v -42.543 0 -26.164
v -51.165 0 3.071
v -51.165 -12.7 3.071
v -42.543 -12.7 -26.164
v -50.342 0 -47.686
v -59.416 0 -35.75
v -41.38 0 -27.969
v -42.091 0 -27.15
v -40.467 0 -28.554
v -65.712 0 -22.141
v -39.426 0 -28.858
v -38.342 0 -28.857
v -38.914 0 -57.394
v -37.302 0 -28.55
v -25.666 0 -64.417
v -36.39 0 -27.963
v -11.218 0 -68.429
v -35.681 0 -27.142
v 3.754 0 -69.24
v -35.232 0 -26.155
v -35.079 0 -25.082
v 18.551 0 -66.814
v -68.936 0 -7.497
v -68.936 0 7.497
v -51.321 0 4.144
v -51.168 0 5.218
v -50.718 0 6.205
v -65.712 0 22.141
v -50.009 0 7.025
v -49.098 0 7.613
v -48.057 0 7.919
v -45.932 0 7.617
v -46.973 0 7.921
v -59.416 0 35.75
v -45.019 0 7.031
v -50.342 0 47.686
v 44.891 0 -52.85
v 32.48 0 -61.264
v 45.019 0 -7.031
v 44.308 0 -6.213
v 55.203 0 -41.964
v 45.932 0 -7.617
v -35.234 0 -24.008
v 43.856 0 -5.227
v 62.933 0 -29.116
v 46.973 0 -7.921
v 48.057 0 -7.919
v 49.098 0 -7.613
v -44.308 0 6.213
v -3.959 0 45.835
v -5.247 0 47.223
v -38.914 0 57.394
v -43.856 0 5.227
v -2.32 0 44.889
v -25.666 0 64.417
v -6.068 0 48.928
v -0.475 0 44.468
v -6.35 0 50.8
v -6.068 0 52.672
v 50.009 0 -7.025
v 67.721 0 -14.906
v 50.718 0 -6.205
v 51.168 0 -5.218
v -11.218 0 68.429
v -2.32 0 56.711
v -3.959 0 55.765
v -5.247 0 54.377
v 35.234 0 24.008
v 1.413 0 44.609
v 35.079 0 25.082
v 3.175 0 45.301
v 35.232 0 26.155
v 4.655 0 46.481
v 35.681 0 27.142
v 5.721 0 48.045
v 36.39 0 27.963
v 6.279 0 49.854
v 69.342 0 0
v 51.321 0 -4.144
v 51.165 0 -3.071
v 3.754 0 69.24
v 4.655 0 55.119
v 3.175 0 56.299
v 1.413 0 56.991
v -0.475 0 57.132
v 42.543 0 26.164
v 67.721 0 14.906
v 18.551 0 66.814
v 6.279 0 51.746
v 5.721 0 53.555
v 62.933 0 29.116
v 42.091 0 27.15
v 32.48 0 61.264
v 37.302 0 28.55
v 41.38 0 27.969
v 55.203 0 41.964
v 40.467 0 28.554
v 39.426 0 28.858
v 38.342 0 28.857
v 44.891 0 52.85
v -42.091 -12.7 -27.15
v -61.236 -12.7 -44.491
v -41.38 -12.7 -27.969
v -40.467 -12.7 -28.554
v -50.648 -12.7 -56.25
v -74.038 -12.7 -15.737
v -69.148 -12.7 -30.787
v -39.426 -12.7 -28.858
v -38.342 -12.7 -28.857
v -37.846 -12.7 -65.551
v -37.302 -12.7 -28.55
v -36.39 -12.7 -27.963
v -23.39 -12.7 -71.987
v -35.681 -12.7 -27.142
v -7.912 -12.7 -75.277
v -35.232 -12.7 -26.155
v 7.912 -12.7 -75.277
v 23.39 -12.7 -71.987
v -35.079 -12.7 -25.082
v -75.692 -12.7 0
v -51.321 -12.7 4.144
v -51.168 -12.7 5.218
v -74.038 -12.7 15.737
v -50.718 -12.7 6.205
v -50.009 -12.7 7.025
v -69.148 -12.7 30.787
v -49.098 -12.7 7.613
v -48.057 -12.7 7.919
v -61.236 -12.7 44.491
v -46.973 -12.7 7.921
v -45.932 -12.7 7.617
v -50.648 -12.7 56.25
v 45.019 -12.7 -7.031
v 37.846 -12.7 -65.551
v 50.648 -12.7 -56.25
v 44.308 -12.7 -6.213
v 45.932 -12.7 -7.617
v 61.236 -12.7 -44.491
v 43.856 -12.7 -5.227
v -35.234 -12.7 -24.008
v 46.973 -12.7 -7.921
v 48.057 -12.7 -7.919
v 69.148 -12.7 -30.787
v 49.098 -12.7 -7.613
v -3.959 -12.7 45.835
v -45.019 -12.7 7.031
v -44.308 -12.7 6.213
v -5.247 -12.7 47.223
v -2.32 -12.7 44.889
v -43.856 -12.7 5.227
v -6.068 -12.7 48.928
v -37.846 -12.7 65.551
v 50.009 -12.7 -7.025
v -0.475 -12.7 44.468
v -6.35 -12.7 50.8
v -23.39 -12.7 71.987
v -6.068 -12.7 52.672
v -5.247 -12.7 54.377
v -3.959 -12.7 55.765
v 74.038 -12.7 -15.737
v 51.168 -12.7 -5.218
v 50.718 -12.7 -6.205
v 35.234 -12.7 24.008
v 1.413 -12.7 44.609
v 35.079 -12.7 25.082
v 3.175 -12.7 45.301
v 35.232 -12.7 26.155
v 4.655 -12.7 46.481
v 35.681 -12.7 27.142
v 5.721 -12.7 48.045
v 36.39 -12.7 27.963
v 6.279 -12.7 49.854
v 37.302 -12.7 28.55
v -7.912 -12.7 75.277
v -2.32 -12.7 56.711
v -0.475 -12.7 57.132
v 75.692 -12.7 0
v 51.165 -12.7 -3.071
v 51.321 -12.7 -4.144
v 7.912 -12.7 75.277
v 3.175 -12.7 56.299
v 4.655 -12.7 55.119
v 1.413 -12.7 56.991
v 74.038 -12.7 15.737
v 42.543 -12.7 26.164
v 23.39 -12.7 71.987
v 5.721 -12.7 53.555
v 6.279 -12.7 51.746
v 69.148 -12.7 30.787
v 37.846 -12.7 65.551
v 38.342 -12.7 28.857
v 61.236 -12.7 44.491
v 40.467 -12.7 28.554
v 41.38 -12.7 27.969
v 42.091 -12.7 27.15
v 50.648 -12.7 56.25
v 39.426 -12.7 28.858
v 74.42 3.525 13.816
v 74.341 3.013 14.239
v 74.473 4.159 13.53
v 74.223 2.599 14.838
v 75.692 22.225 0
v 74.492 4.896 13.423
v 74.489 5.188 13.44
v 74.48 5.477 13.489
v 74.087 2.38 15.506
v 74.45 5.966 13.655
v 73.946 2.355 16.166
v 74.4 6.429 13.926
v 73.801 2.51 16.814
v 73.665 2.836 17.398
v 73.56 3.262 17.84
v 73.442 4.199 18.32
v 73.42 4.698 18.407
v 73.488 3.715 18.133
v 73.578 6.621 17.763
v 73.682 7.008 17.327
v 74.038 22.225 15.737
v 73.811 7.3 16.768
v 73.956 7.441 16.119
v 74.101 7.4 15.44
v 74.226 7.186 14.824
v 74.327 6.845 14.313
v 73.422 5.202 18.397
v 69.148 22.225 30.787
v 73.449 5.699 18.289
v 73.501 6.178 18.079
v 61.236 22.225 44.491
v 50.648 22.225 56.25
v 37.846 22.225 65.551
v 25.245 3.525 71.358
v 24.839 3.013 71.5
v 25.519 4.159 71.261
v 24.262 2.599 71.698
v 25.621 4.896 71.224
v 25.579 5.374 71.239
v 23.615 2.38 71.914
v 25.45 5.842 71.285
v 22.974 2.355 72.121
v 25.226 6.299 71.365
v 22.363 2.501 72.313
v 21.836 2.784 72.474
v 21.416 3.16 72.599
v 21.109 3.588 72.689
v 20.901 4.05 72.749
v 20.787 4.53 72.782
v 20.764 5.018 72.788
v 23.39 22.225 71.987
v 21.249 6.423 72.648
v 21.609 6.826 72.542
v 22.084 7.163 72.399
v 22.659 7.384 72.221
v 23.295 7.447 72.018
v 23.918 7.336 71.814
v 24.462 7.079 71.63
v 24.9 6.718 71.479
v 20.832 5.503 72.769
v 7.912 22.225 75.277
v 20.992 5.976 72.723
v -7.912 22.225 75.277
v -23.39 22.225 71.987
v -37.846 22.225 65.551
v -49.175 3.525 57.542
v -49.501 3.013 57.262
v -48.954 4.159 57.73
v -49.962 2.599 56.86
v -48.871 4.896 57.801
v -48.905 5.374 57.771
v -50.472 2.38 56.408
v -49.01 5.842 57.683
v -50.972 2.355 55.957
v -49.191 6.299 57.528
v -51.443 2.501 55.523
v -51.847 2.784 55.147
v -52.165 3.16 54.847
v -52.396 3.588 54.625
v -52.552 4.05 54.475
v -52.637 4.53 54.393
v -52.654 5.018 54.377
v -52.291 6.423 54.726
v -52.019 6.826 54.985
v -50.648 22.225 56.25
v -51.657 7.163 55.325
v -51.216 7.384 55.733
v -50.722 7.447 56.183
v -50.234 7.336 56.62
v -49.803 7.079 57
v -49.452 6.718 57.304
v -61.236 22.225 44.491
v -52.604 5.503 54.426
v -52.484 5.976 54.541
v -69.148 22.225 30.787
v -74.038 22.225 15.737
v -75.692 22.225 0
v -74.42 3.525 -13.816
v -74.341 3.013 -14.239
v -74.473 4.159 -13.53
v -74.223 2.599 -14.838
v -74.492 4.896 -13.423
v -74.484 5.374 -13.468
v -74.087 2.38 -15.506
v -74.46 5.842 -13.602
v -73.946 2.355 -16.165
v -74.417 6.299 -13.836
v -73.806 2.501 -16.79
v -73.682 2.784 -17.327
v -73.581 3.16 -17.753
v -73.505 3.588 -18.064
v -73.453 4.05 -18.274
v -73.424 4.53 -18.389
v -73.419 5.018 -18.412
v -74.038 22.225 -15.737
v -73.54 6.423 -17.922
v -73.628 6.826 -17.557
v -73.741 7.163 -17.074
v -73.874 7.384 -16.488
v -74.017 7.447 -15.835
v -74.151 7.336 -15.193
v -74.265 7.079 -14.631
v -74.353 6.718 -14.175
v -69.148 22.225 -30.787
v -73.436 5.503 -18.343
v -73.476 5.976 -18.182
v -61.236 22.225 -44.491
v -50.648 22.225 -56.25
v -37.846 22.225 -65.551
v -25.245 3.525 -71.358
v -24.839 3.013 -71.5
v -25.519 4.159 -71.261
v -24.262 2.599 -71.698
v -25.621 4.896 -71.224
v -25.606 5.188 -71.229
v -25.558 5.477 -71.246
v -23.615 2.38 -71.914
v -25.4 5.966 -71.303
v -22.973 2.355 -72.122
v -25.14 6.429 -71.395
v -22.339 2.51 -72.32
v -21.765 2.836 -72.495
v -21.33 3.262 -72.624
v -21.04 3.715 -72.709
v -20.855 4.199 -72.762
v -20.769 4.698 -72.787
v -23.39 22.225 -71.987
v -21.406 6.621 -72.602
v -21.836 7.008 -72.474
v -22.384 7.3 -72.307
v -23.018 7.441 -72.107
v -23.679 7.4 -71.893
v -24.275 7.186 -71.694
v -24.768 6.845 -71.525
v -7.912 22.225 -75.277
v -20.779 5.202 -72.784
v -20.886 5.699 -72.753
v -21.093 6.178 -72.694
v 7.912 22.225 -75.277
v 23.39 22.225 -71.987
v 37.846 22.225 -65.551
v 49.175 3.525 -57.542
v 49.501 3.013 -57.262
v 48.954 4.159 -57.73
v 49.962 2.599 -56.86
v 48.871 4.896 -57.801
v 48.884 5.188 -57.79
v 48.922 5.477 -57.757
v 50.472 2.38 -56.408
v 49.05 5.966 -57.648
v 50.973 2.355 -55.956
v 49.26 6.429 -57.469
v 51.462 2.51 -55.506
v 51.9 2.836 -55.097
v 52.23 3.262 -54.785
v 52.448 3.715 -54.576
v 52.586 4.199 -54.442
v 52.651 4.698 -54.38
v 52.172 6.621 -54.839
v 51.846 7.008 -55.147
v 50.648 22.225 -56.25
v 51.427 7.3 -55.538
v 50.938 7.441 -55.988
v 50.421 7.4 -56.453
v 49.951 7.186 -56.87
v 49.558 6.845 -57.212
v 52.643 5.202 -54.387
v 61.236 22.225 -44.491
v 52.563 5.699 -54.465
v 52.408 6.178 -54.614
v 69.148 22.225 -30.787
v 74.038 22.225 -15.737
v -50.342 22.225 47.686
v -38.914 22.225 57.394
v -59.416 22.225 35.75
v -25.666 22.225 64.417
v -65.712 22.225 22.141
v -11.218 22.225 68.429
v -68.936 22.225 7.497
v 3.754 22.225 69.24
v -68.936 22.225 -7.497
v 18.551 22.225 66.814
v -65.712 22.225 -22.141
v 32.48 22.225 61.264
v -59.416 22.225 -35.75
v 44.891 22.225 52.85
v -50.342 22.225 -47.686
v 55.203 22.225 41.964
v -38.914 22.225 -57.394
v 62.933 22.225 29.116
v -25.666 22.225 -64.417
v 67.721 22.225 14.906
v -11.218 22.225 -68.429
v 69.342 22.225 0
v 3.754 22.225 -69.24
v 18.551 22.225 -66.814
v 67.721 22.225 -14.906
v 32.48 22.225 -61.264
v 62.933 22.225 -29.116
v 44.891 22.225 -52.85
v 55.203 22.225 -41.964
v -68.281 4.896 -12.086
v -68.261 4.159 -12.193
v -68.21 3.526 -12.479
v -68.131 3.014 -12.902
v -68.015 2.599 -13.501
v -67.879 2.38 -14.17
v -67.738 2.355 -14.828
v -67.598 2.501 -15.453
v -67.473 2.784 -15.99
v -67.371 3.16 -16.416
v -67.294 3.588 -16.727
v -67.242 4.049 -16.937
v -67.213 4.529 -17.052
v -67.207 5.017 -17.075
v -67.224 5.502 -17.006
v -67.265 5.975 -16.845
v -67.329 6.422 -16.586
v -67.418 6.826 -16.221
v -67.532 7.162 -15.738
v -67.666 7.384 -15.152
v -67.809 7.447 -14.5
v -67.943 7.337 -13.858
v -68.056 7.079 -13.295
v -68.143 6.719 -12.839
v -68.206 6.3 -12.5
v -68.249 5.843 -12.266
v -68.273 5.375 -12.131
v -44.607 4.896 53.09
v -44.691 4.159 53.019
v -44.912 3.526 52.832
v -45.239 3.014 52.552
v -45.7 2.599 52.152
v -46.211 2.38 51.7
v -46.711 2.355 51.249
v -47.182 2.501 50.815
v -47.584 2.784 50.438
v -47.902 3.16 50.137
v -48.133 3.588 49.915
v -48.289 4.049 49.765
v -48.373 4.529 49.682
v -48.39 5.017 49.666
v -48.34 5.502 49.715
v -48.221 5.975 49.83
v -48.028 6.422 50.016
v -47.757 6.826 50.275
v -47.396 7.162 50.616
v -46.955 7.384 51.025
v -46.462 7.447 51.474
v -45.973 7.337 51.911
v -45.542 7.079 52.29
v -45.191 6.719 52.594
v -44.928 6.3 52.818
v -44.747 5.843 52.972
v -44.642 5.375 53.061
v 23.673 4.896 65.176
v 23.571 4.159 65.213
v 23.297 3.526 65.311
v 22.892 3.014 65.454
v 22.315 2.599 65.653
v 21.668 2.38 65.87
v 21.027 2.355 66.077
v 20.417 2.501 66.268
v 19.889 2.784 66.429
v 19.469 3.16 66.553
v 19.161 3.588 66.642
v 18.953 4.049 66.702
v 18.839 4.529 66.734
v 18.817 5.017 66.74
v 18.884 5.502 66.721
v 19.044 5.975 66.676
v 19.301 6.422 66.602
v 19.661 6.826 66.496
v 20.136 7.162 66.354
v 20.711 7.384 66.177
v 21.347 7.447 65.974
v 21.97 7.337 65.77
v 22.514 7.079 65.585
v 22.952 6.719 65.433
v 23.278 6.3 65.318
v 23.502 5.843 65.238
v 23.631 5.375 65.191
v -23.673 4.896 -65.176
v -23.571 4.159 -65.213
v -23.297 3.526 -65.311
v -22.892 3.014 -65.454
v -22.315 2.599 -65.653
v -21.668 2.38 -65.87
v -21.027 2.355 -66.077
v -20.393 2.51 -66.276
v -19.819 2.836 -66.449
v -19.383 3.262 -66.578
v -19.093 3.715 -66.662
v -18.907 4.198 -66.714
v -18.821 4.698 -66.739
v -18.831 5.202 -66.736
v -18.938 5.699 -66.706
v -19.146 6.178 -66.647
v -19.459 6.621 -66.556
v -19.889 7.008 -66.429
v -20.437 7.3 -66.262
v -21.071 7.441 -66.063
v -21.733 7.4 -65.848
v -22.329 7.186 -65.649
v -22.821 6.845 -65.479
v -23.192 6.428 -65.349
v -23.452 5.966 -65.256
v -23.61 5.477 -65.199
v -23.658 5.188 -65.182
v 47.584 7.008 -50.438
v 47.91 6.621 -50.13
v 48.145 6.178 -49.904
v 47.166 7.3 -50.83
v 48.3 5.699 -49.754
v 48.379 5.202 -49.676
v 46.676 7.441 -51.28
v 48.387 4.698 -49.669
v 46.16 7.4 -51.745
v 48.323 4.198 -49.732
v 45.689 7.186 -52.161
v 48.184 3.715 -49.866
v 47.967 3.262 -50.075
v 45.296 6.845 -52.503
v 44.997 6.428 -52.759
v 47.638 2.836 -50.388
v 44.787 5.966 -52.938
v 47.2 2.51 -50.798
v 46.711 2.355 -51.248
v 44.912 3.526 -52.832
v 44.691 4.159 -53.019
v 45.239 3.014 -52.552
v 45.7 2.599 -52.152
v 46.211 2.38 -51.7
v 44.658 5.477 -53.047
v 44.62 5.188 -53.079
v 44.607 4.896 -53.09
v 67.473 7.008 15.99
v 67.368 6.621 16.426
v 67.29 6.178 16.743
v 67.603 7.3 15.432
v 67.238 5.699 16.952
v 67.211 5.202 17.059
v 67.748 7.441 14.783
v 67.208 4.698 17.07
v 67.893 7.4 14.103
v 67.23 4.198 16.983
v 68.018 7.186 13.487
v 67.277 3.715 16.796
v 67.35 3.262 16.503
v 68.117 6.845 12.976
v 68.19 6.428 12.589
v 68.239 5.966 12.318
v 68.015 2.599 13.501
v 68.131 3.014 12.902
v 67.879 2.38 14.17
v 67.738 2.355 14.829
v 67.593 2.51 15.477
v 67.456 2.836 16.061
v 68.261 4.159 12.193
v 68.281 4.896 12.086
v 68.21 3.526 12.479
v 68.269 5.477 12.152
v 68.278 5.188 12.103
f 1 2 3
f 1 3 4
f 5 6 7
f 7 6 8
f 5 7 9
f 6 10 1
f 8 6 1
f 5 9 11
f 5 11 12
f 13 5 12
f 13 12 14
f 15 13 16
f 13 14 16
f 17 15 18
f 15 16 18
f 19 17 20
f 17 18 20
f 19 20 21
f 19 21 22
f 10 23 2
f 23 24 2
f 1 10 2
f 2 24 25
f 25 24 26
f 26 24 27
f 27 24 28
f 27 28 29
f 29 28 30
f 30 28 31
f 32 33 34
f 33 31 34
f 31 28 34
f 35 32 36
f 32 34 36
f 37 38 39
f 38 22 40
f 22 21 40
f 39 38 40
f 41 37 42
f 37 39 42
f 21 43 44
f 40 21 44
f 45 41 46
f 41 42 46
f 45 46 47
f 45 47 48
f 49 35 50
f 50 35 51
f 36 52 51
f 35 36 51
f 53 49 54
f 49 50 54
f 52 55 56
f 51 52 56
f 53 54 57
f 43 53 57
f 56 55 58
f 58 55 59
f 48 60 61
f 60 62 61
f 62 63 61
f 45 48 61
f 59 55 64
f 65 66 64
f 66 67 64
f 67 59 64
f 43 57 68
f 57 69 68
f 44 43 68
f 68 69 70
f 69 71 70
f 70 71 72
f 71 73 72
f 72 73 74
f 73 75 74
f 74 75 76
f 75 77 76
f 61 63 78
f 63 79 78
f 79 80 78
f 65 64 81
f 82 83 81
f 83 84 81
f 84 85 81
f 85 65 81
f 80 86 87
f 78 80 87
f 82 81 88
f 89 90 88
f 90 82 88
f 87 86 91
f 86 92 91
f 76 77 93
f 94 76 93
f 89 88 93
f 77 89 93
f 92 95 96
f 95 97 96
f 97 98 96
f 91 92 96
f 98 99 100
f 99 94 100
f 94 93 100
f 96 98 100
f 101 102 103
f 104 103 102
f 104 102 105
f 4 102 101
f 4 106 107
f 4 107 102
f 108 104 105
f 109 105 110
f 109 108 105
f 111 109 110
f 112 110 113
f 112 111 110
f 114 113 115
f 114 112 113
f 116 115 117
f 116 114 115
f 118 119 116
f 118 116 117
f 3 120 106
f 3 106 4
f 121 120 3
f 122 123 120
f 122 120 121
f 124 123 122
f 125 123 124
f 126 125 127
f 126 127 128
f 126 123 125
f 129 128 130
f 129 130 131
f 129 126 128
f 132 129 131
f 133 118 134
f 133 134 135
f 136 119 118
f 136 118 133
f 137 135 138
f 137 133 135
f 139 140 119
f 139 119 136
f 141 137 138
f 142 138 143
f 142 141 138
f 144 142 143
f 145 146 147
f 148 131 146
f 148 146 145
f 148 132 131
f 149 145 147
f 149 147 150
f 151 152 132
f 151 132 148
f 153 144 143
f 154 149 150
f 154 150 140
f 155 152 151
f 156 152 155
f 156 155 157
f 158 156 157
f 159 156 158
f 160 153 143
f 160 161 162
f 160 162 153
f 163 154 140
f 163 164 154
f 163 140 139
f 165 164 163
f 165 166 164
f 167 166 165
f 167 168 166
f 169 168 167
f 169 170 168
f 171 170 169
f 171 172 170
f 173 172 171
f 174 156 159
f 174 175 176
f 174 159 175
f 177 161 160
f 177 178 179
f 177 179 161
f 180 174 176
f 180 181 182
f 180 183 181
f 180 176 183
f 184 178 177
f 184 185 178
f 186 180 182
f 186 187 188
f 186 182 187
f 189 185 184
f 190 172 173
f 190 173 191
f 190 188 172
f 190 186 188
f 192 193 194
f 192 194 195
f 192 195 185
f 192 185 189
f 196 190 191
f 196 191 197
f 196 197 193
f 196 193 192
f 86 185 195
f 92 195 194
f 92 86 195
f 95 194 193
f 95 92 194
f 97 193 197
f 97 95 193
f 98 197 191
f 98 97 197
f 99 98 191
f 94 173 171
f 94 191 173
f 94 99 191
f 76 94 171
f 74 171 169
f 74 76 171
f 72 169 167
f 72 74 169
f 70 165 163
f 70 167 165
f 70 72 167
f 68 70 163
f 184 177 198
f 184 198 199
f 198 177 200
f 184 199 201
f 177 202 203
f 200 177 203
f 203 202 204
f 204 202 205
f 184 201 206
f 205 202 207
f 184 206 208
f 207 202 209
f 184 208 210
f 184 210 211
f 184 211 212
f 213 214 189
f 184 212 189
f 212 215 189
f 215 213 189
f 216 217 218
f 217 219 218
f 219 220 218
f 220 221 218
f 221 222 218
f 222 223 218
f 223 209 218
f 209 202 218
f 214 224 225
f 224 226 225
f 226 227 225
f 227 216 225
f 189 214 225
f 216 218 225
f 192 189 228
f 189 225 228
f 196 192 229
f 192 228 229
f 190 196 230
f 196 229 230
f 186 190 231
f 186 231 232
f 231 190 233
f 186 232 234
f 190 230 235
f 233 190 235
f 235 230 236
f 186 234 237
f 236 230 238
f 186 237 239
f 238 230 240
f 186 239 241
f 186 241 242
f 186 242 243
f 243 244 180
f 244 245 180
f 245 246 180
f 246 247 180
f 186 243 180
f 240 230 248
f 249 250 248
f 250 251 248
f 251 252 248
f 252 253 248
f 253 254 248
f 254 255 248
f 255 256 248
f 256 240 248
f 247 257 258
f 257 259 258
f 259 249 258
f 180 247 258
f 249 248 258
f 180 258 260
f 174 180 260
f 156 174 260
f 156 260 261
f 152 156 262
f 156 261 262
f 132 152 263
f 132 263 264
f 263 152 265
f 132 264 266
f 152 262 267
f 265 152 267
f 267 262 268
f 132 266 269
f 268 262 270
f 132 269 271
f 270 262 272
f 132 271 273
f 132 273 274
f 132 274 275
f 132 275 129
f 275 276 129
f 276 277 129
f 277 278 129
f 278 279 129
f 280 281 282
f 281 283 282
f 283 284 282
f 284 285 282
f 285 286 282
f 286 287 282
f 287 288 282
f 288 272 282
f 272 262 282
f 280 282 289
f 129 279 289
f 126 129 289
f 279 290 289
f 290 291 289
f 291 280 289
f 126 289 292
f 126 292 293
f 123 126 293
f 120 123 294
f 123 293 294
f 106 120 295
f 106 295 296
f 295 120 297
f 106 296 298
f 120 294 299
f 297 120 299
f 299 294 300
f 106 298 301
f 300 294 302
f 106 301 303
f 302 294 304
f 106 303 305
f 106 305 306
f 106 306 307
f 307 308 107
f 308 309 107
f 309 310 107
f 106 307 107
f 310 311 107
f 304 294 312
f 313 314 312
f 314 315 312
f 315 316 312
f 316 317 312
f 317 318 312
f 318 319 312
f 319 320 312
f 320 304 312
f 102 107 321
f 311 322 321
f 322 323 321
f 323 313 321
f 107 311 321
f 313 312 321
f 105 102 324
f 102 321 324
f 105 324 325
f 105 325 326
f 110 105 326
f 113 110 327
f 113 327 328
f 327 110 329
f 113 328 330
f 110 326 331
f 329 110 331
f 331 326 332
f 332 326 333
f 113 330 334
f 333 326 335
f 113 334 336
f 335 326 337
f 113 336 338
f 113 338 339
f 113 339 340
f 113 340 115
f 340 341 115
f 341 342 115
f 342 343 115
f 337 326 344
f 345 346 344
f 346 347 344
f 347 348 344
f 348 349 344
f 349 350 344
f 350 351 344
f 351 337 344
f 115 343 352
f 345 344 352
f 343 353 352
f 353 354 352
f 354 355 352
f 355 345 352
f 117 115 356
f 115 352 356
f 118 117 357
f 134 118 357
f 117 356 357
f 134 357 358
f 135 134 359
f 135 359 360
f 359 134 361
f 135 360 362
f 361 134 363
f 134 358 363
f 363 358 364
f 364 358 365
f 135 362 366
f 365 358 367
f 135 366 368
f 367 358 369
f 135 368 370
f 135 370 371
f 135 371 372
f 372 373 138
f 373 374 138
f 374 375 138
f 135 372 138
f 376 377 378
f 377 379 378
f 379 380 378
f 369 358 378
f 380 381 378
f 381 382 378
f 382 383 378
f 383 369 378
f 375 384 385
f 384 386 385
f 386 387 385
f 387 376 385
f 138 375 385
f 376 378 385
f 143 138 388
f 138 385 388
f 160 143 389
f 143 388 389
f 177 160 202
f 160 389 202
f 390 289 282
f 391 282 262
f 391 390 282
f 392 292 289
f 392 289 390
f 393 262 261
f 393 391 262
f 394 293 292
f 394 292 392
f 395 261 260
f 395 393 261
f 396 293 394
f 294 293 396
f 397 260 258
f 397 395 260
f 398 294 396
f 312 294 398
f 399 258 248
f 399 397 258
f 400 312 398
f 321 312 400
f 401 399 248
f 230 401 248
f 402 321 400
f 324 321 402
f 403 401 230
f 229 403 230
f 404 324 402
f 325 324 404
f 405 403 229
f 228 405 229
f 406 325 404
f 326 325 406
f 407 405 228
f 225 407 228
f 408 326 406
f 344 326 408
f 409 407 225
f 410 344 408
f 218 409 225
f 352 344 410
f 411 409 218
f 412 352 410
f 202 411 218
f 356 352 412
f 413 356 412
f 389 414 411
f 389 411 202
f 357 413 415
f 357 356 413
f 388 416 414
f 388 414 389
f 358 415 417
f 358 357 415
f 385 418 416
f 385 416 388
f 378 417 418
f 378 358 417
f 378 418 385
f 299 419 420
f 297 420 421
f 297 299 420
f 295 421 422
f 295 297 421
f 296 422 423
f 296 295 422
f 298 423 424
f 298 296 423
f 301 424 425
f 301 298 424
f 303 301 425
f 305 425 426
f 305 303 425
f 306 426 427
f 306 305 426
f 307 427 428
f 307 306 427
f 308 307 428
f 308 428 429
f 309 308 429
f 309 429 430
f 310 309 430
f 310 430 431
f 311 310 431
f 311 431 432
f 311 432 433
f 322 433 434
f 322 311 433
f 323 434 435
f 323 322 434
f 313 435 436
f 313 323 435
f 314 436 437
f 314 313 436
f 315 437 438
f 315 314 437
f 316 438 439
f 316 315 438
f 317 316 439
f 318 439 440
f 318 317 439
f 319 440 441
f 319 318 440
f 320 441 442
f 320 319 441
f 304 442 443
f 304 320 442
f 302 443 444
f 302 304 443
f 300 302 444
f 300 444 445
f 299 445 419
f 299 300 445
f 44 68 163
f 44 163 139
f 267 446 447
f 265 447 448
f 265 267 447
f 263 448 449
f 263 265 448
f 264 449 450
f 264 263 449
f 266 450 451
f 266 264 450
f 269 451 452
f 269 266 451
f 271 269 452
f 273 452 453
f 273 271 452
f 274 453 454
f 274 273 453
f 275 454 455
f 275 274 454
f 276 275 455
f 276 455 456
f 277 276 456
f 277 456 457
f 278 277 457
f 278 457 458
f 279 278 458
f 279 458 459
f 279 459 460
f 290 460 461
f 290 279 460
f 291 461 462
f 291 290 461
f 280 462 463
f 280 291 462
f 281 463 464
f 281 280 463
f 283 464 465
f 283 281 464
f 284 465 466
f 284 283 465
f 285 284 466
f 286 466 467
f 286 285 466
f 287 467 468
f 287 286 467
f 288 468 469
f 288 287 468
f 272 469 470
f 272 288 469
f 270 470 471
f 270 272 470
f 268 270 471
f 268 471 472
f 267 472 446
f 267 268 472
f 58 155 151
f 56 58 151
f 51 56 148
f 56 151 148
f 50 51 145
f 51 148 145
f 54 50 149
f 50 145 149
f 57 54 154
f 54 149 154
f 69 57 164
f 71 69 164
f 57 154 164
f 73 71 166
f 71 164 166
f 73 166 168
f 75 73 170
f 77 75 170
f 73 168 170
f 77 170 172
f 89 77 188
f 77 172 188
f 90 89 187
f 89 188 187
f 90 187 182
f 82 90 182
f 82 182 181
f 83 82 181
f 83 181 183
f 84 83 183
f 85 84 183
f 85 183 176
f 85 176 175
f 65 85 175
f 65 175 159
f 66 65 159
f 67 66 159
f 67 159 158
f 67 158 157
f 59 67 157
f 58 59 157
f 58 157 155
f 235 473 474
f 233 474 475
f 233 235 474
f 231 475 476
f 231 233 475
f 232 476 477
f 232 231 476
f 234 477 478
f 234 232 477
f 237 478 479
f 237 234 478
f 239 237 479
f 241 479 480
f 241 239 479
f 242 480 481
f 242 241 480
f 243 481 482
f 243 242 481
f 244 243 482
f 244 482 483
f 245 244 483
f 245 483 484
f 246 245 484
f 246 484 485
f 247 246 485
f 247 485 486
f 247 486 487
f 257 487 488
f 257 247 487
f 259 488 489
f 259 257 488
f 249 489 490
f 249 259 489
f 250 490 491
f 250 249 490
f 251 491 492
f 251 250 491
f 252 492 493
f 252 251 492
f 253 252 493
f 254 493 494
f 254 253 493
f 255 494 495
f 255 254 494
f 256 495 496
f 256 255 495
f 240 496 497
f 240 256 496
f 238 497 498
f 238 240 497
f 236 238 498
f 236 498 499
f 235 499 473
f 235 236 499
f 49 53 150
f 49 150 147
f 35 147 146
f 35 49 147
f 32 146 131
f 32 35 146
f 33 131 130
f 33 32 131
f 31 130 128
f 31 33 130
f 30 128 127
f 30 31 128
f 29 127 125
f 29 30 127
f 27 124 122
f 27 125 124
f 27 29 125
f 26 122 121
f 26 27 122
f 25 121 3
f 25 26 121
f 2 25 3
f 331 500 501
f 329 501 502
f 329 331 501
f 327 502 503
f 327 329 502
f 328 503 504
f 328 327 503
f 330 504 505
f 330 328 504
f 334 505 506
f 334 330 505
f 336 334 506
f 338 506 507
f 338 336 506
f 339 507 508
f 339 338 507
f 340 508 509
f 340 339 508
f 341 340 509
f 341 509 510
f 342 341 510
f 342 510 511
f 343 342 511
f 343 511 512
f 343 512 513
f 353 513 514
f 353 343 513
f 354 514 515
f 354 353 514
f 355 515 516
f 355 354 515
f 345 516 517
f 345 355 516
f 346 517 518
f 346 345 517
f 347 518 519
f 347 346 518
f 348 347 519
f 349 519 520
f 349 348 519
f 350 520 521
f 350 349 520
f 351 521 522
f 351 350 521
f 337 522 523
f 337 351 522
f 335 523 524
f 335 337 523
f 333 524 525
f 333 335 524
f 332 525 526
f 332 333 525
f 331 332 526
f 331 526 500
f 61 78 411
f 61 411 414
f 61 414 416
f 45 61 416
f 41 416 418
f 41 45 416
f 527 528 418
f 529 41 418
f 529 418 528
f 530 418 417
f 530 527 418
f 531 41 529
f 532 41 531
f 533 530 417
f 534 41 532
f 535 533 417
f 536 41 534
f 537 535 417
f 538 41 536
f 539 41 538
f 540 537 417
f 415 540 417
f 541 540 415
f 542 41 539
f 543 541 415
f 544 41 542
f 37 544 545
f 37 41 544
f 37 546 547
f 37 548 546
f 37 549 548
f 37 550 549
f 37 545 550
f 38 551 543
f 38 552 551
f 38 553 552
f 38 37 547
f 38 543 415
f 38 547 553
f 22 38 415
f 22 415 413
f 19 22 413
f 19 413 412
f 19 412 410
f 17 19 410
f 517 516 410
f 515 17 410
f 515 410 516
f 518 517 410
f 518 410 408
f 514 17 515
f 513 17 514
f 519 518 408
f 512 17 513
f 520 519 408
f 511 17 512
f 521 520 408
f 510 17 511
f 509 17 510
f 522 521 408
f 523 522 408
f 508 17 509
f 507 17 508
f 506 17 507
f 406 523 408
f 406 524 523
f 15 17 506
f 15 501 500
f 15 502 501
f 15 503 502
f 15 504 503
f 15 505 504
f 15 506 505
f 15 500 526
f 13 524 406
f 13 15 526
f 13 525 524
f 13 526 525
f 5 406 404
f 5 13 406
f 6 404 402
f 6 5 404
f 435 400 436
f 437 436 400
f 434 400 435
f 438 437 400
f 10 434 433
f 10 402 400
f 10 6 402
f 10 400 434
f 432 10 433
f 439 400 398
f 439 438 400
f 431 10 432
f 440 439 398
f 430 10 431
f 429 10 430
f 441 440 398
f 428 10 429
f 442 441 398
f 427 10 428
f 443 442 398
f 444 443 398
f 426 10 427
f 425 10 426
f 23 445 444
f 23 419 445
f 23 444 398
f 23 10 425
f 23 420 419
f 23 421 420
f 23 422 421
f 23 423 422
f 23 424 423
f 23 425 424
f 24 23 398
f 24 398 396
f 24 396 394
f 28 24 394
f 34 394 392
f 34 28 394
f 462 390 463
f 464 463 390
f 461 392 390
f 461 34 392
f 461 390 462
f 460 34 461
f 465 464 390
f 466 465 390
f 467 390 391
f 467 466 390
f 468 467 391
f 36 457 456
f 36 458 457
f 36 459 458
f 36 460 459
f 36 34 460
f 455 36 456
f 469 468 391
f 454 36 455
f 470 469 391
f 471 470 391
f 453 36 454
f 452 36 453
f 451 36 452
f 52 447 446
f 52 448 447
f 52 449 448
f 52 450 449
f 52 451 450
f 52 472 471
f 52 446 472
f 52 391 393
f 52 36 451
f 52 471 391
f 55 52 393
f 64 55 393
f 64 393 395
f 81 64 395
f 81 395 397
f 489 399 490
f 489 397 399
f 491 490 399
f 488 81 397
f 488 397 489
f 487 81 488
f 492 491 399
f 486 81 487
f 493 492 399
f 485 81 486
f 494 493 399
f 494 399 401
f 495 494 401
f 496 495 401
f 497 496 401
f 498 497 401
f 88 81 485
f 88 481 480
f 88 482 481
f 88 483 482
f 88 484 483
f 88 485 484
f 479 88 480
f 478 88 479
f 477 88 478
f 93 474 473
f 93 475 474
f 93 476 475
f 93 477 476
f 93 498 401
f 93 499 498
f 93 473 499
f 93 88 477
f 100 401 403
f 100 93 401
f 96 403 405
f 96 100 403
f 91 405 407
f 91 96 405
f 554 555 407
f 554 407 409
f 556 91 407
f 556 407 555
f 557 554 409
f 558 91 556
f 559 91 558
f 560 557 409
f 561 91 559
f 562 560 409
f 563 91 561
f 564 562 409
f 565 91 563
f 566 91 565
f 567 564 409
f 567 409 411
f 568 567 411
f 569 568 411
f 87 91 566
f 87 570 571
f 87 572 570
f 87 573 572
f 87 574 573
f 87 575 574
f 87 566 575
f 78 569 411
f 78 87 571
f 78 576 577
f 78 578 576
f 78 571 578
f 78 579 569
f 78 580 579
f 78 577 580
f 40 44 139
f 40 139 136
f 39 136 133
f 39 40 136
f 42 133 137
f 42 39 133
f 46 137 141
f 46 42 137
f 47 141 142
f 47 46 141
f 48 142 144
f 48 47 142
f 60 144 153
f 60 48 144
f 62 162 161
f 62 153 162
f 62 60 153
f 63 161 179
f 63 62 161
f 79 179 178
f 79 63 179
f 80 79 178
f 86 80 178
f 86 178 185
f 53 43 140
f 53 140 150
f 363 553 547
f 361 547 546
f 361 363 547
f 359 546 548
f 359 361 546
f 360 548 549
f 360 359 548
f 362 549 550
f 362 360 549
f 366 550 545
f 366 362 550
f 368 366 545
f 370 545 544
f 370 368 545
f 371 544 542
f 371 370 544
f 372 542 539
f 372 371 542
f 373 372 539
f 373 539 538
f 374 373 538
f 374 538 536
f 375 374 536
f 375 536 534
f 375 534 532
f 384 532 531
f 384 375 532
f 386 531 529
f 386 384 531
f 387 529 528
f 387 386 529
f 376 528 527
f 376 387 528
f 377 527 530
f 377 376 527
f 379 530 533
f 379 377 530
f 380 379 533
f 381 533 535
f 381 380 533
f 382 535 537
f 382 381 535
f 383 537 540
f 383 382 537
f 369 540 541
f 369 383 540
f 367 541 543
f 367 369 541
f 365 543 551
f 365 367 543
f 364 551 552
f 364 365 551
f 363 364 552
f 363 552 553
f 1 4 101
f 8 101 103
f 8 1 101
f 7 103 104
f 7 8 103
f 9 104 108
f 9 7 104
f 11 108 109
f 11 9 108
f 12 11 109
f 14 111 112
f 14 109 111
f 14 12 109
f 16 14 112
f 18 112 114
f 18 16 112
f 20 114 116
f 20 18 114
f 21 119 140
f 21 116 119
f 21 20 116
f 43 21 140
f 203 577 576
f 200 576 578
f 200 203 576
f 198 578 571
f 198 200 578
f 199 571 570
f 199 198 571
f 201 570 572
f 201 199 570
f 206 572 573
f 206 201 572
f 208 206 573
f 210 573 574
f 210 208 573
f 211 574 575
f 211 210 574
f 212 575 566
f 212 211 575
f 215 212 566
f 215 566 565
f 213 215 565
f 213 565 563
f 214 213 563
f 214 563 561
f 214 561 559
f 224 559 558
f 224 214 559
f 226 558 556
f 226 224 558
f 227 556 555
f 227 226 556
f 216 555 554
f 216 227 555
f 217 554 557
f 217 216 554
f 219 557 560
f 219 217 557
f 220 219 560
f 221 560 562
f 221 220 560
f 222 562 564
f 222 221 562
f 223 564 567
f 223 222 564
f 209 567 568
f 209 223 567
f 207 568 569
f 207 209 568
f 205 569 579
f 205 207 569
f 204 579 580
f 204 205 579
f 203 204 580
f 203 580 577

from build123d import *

# Parameters (mm, degrees)
SKETCH1_R                            = 75.692
SKETCH1_R_2                          = 69.342
BOSS_EXTRUDE1_DEPTH                  = 22.225
SKETCH2_R                            = 75.692
BOSS_EXTRUDE2_DEPTH                  = 12.7
TAP_DRILL_FOR_1_4_20_TAP1_AT_2_COUNT = 2
TAP_DRILL_FOR_1_4_20_TAP1_AT_2_PITCH = 53.488399339
CIRPATTERN1_COUNT                    = 6
F_1_2_0_5_DIAMETER_HOLE1_D           = 12.7
CUT_EXTRUDE1_DEPTH                   = 13.7000001


with BuildPart() as part:
    # Sketch1 → Boss-Extrude1 (new body)
    with BuildSketch(Plane(origin=(0, 0, 0), x_dir=(1, 0, 0), z_dir=(0, 1, 0))):
        Circle(SKETCH1_R)
        Circle(SKETCH1_R_2, mode=Mode.SUBTRACT)
    extrude(amount=BOSS_EXTRUDE1_DEPTH)

    # Sketch2 → Boss-Extrude2 (add)
    with BuildSketch(Plane.XZ):
        Circle(SKETCH2_R)
    extrude(amount=BOSS_EXTRUDE2_DEPTH)

    # Sketch4 → Tap Drill for 1/4-20 Tap1 (revolve, cut)
    with BuildSketch(Plane(origin=(73.997176623, 4.896298223, 15.927859738), x_dir=(0.210429897, 0, -0.97760895), z_dir=(0, 1, 0))):
        Polygon((0, 0), (0, 11.185816902), (2.5527, 9.652), (2.5527, 0), align=None)
    tap_drill_for_1_4_20_tap1 = revolve(axis=Axis((80.204993454, 4.896298223, 17.264089582), (-0.97760895, 0, -0.210429897)), mode=Mode.SUBTRACT)

    # Tap Drill for 1/4-20 Tap1 at 2: Tap Drill for 1/4-20 Tap1 ×2
    with Locations(*[Vector(-0.110438581, 0.851210999, 0.51307227) * (i * TAP_DRILL_FOR_1_4_20_TAP1_AT_2_PITCH) for i in range(1, TAP_DRILL_FOR_1_4_20_TAP1_AT_2_COUNT)]):
        add(tap_drill_for_1_4_20_tap1, mode=Mode.SUBTRACT)

    # CirPattern1: Tap Drill for 1/4-20 Tap1 ×6 about axis
    cirpattern1_axis = Axis((0, 22.225, 0), (0, -1, 0))
    for i in range(1, CIRPATTERN1_COUNT):
        add(tap_drill_for_1_4_20_tap1.rotate(cirpattern1_axis, i * 360 / CIRPATTERN1_COUNT), mode=Mode.SUBTRACT)

    # CirPattern1 copy 1 sketch → CirPattern1 copy 1 (revolve, cut)
    with BuildSketch(Plane(origin=(-3.515628412, 50.426212075, 80.653301416), x_dir=(0.951849134, 0, -0.306566839), z_dir=(0, 1, 0))):
        Polygon((0, 0), (0, 11.185816902), (2.5527, 9.652), (2.5527, 0), align=None)
    revolve(axis=Axis((-1.568928987, 50.426212075, 86.697543415), (-0.306566839, 0, -0.951849134)), mode=Mode.SUBTRACT)

    # CirPattern1 copy 2 sketch → CirPattern1 copy 2 (revolve, cut)
    with BuildSketch(Plane(origin=(-71.605622131, 50.426212075, 37.282027193), x_dir=(0.741419237, 0, 0.671042111), z_dir=(0, 1, 0))):
        Polygon((0, 0), (0, 11.185816902), (2.5527, 9.652), (2.5527, 0), align=None)
    revolve(axis=Axis((-75.866739537, 50.426212075, 41.990039348), (0.671042111, 0, -0.741419237)), mode=Mode.SUBTRACT)

    # CirPattern1 copy 3 sketch → CirPattern1 copy 3 (revolve, cut)
    with BuildSketch(Plane(origin=(-68.089993719, 50.426212075, -43.371274223), x_dir=(-0.210429897, 0, 0.97760895), z_dir=(0, 1, 0))):
        Polygon((0, 0), (0, 11.185816902), (2.5527, 9.652), (2.5527, 0), align=None)
    revolve(axis=Axis((-74.29781055, 50.426212075, -44.707504067), (0.97760895, 0, 0.210429897)), mode=Mode.SUBTRACT)

    # CirPattern1 copy 4 sketch → CirPattern1 copy 4 (revolve, cut)
    with BuildSketch(Plane(origin=(3.515628412, 50.426212075, -80.653301416), x_dir=(-0.951849134, 0, 0.306566839), z_dir=(0, 1, 0))):
        Polygon((0, 0), (0, 11.185816902), (2.5527, 9.652), (2.5527, 0), align=None)
    revolve(axis=Axis((1.568928987, 50.426212075, -86.697543415), (0.306566839, 0, 0.951849134)), mode=Mode.SUBTRACT)

    # CirPattern1 copy 5 sketch → CirPattern1 copy 5 (revolve, cut)
    with BuildSketch(Plane(origin=(71.605622131, 50.426212075, -37.282027193), x_dir=(-0.741419237, 0, -0.671042111), z_dir=(0, 1, 0))):
        Polygon((0, 0), (0, 11.185816902), (2.5527, 9.652), (2.5527, 0), align=None)
    revolve(axis=Axis((75.866739537, 50.426212075, -41.990039348), (-0.671042111, 0, 0.741419237)), mode=Mode.SUBTRACT)

    # 1/2 (0.5) Diameter Hole1 (through all)
    with Locations(Plane(origin=(0, 0, 0), x_dir=(1, 0, 0), z_dir=(0, 1, 0))):
        with Locations((0, -50.8)):
            Hole(F_1_2_0_5_DIAMETER_HOLE1_D / 2)

    # Sketch11 → Cut-Extrude1 (cut, through all)
    with BuildSketch(Plane(origin=(0, 0, 0), x_dir=(1, 0, 0), z_dir=(0, 1, 0))):
        with BuildLine():
            Line((-51.165057741, -3.071167846), (-42.54303006, 26.163931584))
            ThreePointArc((-42.54303006, 26.163931584), (-37.810889171, 28.740565552), (-35.234255202, 24.008424663))
            Line((-35.234255202, 24.008424663), (-43.856282883, -5.226674766))
            ThreePointArc((-43.856282883, -5.226674766), (-48.588423772, -7.803308735), (-51.165057741, -3.071167846))
        make_face()
        with BuildLine():
            Line((35.234255202, -24.008424663), (43.856282883, 5.226674766))
            ThreePointArc((43.856282883, 5.226674766), (48.588423772, 7.803308735), (51.165057741, 3.071167846))
            Line((51.165057741, 3.071167846), (42.54303006, -26.163931584))
            ThreePointArc((42.54303006, -26.163931584), (37.810889171, -28.740565552), (35.234255202, -24.008424663))
        make_face()
    extrude(amount=-CUT_EXTRUDE1_DEPTH, mode=Mode.SUBTRACT)


solid = part.part
